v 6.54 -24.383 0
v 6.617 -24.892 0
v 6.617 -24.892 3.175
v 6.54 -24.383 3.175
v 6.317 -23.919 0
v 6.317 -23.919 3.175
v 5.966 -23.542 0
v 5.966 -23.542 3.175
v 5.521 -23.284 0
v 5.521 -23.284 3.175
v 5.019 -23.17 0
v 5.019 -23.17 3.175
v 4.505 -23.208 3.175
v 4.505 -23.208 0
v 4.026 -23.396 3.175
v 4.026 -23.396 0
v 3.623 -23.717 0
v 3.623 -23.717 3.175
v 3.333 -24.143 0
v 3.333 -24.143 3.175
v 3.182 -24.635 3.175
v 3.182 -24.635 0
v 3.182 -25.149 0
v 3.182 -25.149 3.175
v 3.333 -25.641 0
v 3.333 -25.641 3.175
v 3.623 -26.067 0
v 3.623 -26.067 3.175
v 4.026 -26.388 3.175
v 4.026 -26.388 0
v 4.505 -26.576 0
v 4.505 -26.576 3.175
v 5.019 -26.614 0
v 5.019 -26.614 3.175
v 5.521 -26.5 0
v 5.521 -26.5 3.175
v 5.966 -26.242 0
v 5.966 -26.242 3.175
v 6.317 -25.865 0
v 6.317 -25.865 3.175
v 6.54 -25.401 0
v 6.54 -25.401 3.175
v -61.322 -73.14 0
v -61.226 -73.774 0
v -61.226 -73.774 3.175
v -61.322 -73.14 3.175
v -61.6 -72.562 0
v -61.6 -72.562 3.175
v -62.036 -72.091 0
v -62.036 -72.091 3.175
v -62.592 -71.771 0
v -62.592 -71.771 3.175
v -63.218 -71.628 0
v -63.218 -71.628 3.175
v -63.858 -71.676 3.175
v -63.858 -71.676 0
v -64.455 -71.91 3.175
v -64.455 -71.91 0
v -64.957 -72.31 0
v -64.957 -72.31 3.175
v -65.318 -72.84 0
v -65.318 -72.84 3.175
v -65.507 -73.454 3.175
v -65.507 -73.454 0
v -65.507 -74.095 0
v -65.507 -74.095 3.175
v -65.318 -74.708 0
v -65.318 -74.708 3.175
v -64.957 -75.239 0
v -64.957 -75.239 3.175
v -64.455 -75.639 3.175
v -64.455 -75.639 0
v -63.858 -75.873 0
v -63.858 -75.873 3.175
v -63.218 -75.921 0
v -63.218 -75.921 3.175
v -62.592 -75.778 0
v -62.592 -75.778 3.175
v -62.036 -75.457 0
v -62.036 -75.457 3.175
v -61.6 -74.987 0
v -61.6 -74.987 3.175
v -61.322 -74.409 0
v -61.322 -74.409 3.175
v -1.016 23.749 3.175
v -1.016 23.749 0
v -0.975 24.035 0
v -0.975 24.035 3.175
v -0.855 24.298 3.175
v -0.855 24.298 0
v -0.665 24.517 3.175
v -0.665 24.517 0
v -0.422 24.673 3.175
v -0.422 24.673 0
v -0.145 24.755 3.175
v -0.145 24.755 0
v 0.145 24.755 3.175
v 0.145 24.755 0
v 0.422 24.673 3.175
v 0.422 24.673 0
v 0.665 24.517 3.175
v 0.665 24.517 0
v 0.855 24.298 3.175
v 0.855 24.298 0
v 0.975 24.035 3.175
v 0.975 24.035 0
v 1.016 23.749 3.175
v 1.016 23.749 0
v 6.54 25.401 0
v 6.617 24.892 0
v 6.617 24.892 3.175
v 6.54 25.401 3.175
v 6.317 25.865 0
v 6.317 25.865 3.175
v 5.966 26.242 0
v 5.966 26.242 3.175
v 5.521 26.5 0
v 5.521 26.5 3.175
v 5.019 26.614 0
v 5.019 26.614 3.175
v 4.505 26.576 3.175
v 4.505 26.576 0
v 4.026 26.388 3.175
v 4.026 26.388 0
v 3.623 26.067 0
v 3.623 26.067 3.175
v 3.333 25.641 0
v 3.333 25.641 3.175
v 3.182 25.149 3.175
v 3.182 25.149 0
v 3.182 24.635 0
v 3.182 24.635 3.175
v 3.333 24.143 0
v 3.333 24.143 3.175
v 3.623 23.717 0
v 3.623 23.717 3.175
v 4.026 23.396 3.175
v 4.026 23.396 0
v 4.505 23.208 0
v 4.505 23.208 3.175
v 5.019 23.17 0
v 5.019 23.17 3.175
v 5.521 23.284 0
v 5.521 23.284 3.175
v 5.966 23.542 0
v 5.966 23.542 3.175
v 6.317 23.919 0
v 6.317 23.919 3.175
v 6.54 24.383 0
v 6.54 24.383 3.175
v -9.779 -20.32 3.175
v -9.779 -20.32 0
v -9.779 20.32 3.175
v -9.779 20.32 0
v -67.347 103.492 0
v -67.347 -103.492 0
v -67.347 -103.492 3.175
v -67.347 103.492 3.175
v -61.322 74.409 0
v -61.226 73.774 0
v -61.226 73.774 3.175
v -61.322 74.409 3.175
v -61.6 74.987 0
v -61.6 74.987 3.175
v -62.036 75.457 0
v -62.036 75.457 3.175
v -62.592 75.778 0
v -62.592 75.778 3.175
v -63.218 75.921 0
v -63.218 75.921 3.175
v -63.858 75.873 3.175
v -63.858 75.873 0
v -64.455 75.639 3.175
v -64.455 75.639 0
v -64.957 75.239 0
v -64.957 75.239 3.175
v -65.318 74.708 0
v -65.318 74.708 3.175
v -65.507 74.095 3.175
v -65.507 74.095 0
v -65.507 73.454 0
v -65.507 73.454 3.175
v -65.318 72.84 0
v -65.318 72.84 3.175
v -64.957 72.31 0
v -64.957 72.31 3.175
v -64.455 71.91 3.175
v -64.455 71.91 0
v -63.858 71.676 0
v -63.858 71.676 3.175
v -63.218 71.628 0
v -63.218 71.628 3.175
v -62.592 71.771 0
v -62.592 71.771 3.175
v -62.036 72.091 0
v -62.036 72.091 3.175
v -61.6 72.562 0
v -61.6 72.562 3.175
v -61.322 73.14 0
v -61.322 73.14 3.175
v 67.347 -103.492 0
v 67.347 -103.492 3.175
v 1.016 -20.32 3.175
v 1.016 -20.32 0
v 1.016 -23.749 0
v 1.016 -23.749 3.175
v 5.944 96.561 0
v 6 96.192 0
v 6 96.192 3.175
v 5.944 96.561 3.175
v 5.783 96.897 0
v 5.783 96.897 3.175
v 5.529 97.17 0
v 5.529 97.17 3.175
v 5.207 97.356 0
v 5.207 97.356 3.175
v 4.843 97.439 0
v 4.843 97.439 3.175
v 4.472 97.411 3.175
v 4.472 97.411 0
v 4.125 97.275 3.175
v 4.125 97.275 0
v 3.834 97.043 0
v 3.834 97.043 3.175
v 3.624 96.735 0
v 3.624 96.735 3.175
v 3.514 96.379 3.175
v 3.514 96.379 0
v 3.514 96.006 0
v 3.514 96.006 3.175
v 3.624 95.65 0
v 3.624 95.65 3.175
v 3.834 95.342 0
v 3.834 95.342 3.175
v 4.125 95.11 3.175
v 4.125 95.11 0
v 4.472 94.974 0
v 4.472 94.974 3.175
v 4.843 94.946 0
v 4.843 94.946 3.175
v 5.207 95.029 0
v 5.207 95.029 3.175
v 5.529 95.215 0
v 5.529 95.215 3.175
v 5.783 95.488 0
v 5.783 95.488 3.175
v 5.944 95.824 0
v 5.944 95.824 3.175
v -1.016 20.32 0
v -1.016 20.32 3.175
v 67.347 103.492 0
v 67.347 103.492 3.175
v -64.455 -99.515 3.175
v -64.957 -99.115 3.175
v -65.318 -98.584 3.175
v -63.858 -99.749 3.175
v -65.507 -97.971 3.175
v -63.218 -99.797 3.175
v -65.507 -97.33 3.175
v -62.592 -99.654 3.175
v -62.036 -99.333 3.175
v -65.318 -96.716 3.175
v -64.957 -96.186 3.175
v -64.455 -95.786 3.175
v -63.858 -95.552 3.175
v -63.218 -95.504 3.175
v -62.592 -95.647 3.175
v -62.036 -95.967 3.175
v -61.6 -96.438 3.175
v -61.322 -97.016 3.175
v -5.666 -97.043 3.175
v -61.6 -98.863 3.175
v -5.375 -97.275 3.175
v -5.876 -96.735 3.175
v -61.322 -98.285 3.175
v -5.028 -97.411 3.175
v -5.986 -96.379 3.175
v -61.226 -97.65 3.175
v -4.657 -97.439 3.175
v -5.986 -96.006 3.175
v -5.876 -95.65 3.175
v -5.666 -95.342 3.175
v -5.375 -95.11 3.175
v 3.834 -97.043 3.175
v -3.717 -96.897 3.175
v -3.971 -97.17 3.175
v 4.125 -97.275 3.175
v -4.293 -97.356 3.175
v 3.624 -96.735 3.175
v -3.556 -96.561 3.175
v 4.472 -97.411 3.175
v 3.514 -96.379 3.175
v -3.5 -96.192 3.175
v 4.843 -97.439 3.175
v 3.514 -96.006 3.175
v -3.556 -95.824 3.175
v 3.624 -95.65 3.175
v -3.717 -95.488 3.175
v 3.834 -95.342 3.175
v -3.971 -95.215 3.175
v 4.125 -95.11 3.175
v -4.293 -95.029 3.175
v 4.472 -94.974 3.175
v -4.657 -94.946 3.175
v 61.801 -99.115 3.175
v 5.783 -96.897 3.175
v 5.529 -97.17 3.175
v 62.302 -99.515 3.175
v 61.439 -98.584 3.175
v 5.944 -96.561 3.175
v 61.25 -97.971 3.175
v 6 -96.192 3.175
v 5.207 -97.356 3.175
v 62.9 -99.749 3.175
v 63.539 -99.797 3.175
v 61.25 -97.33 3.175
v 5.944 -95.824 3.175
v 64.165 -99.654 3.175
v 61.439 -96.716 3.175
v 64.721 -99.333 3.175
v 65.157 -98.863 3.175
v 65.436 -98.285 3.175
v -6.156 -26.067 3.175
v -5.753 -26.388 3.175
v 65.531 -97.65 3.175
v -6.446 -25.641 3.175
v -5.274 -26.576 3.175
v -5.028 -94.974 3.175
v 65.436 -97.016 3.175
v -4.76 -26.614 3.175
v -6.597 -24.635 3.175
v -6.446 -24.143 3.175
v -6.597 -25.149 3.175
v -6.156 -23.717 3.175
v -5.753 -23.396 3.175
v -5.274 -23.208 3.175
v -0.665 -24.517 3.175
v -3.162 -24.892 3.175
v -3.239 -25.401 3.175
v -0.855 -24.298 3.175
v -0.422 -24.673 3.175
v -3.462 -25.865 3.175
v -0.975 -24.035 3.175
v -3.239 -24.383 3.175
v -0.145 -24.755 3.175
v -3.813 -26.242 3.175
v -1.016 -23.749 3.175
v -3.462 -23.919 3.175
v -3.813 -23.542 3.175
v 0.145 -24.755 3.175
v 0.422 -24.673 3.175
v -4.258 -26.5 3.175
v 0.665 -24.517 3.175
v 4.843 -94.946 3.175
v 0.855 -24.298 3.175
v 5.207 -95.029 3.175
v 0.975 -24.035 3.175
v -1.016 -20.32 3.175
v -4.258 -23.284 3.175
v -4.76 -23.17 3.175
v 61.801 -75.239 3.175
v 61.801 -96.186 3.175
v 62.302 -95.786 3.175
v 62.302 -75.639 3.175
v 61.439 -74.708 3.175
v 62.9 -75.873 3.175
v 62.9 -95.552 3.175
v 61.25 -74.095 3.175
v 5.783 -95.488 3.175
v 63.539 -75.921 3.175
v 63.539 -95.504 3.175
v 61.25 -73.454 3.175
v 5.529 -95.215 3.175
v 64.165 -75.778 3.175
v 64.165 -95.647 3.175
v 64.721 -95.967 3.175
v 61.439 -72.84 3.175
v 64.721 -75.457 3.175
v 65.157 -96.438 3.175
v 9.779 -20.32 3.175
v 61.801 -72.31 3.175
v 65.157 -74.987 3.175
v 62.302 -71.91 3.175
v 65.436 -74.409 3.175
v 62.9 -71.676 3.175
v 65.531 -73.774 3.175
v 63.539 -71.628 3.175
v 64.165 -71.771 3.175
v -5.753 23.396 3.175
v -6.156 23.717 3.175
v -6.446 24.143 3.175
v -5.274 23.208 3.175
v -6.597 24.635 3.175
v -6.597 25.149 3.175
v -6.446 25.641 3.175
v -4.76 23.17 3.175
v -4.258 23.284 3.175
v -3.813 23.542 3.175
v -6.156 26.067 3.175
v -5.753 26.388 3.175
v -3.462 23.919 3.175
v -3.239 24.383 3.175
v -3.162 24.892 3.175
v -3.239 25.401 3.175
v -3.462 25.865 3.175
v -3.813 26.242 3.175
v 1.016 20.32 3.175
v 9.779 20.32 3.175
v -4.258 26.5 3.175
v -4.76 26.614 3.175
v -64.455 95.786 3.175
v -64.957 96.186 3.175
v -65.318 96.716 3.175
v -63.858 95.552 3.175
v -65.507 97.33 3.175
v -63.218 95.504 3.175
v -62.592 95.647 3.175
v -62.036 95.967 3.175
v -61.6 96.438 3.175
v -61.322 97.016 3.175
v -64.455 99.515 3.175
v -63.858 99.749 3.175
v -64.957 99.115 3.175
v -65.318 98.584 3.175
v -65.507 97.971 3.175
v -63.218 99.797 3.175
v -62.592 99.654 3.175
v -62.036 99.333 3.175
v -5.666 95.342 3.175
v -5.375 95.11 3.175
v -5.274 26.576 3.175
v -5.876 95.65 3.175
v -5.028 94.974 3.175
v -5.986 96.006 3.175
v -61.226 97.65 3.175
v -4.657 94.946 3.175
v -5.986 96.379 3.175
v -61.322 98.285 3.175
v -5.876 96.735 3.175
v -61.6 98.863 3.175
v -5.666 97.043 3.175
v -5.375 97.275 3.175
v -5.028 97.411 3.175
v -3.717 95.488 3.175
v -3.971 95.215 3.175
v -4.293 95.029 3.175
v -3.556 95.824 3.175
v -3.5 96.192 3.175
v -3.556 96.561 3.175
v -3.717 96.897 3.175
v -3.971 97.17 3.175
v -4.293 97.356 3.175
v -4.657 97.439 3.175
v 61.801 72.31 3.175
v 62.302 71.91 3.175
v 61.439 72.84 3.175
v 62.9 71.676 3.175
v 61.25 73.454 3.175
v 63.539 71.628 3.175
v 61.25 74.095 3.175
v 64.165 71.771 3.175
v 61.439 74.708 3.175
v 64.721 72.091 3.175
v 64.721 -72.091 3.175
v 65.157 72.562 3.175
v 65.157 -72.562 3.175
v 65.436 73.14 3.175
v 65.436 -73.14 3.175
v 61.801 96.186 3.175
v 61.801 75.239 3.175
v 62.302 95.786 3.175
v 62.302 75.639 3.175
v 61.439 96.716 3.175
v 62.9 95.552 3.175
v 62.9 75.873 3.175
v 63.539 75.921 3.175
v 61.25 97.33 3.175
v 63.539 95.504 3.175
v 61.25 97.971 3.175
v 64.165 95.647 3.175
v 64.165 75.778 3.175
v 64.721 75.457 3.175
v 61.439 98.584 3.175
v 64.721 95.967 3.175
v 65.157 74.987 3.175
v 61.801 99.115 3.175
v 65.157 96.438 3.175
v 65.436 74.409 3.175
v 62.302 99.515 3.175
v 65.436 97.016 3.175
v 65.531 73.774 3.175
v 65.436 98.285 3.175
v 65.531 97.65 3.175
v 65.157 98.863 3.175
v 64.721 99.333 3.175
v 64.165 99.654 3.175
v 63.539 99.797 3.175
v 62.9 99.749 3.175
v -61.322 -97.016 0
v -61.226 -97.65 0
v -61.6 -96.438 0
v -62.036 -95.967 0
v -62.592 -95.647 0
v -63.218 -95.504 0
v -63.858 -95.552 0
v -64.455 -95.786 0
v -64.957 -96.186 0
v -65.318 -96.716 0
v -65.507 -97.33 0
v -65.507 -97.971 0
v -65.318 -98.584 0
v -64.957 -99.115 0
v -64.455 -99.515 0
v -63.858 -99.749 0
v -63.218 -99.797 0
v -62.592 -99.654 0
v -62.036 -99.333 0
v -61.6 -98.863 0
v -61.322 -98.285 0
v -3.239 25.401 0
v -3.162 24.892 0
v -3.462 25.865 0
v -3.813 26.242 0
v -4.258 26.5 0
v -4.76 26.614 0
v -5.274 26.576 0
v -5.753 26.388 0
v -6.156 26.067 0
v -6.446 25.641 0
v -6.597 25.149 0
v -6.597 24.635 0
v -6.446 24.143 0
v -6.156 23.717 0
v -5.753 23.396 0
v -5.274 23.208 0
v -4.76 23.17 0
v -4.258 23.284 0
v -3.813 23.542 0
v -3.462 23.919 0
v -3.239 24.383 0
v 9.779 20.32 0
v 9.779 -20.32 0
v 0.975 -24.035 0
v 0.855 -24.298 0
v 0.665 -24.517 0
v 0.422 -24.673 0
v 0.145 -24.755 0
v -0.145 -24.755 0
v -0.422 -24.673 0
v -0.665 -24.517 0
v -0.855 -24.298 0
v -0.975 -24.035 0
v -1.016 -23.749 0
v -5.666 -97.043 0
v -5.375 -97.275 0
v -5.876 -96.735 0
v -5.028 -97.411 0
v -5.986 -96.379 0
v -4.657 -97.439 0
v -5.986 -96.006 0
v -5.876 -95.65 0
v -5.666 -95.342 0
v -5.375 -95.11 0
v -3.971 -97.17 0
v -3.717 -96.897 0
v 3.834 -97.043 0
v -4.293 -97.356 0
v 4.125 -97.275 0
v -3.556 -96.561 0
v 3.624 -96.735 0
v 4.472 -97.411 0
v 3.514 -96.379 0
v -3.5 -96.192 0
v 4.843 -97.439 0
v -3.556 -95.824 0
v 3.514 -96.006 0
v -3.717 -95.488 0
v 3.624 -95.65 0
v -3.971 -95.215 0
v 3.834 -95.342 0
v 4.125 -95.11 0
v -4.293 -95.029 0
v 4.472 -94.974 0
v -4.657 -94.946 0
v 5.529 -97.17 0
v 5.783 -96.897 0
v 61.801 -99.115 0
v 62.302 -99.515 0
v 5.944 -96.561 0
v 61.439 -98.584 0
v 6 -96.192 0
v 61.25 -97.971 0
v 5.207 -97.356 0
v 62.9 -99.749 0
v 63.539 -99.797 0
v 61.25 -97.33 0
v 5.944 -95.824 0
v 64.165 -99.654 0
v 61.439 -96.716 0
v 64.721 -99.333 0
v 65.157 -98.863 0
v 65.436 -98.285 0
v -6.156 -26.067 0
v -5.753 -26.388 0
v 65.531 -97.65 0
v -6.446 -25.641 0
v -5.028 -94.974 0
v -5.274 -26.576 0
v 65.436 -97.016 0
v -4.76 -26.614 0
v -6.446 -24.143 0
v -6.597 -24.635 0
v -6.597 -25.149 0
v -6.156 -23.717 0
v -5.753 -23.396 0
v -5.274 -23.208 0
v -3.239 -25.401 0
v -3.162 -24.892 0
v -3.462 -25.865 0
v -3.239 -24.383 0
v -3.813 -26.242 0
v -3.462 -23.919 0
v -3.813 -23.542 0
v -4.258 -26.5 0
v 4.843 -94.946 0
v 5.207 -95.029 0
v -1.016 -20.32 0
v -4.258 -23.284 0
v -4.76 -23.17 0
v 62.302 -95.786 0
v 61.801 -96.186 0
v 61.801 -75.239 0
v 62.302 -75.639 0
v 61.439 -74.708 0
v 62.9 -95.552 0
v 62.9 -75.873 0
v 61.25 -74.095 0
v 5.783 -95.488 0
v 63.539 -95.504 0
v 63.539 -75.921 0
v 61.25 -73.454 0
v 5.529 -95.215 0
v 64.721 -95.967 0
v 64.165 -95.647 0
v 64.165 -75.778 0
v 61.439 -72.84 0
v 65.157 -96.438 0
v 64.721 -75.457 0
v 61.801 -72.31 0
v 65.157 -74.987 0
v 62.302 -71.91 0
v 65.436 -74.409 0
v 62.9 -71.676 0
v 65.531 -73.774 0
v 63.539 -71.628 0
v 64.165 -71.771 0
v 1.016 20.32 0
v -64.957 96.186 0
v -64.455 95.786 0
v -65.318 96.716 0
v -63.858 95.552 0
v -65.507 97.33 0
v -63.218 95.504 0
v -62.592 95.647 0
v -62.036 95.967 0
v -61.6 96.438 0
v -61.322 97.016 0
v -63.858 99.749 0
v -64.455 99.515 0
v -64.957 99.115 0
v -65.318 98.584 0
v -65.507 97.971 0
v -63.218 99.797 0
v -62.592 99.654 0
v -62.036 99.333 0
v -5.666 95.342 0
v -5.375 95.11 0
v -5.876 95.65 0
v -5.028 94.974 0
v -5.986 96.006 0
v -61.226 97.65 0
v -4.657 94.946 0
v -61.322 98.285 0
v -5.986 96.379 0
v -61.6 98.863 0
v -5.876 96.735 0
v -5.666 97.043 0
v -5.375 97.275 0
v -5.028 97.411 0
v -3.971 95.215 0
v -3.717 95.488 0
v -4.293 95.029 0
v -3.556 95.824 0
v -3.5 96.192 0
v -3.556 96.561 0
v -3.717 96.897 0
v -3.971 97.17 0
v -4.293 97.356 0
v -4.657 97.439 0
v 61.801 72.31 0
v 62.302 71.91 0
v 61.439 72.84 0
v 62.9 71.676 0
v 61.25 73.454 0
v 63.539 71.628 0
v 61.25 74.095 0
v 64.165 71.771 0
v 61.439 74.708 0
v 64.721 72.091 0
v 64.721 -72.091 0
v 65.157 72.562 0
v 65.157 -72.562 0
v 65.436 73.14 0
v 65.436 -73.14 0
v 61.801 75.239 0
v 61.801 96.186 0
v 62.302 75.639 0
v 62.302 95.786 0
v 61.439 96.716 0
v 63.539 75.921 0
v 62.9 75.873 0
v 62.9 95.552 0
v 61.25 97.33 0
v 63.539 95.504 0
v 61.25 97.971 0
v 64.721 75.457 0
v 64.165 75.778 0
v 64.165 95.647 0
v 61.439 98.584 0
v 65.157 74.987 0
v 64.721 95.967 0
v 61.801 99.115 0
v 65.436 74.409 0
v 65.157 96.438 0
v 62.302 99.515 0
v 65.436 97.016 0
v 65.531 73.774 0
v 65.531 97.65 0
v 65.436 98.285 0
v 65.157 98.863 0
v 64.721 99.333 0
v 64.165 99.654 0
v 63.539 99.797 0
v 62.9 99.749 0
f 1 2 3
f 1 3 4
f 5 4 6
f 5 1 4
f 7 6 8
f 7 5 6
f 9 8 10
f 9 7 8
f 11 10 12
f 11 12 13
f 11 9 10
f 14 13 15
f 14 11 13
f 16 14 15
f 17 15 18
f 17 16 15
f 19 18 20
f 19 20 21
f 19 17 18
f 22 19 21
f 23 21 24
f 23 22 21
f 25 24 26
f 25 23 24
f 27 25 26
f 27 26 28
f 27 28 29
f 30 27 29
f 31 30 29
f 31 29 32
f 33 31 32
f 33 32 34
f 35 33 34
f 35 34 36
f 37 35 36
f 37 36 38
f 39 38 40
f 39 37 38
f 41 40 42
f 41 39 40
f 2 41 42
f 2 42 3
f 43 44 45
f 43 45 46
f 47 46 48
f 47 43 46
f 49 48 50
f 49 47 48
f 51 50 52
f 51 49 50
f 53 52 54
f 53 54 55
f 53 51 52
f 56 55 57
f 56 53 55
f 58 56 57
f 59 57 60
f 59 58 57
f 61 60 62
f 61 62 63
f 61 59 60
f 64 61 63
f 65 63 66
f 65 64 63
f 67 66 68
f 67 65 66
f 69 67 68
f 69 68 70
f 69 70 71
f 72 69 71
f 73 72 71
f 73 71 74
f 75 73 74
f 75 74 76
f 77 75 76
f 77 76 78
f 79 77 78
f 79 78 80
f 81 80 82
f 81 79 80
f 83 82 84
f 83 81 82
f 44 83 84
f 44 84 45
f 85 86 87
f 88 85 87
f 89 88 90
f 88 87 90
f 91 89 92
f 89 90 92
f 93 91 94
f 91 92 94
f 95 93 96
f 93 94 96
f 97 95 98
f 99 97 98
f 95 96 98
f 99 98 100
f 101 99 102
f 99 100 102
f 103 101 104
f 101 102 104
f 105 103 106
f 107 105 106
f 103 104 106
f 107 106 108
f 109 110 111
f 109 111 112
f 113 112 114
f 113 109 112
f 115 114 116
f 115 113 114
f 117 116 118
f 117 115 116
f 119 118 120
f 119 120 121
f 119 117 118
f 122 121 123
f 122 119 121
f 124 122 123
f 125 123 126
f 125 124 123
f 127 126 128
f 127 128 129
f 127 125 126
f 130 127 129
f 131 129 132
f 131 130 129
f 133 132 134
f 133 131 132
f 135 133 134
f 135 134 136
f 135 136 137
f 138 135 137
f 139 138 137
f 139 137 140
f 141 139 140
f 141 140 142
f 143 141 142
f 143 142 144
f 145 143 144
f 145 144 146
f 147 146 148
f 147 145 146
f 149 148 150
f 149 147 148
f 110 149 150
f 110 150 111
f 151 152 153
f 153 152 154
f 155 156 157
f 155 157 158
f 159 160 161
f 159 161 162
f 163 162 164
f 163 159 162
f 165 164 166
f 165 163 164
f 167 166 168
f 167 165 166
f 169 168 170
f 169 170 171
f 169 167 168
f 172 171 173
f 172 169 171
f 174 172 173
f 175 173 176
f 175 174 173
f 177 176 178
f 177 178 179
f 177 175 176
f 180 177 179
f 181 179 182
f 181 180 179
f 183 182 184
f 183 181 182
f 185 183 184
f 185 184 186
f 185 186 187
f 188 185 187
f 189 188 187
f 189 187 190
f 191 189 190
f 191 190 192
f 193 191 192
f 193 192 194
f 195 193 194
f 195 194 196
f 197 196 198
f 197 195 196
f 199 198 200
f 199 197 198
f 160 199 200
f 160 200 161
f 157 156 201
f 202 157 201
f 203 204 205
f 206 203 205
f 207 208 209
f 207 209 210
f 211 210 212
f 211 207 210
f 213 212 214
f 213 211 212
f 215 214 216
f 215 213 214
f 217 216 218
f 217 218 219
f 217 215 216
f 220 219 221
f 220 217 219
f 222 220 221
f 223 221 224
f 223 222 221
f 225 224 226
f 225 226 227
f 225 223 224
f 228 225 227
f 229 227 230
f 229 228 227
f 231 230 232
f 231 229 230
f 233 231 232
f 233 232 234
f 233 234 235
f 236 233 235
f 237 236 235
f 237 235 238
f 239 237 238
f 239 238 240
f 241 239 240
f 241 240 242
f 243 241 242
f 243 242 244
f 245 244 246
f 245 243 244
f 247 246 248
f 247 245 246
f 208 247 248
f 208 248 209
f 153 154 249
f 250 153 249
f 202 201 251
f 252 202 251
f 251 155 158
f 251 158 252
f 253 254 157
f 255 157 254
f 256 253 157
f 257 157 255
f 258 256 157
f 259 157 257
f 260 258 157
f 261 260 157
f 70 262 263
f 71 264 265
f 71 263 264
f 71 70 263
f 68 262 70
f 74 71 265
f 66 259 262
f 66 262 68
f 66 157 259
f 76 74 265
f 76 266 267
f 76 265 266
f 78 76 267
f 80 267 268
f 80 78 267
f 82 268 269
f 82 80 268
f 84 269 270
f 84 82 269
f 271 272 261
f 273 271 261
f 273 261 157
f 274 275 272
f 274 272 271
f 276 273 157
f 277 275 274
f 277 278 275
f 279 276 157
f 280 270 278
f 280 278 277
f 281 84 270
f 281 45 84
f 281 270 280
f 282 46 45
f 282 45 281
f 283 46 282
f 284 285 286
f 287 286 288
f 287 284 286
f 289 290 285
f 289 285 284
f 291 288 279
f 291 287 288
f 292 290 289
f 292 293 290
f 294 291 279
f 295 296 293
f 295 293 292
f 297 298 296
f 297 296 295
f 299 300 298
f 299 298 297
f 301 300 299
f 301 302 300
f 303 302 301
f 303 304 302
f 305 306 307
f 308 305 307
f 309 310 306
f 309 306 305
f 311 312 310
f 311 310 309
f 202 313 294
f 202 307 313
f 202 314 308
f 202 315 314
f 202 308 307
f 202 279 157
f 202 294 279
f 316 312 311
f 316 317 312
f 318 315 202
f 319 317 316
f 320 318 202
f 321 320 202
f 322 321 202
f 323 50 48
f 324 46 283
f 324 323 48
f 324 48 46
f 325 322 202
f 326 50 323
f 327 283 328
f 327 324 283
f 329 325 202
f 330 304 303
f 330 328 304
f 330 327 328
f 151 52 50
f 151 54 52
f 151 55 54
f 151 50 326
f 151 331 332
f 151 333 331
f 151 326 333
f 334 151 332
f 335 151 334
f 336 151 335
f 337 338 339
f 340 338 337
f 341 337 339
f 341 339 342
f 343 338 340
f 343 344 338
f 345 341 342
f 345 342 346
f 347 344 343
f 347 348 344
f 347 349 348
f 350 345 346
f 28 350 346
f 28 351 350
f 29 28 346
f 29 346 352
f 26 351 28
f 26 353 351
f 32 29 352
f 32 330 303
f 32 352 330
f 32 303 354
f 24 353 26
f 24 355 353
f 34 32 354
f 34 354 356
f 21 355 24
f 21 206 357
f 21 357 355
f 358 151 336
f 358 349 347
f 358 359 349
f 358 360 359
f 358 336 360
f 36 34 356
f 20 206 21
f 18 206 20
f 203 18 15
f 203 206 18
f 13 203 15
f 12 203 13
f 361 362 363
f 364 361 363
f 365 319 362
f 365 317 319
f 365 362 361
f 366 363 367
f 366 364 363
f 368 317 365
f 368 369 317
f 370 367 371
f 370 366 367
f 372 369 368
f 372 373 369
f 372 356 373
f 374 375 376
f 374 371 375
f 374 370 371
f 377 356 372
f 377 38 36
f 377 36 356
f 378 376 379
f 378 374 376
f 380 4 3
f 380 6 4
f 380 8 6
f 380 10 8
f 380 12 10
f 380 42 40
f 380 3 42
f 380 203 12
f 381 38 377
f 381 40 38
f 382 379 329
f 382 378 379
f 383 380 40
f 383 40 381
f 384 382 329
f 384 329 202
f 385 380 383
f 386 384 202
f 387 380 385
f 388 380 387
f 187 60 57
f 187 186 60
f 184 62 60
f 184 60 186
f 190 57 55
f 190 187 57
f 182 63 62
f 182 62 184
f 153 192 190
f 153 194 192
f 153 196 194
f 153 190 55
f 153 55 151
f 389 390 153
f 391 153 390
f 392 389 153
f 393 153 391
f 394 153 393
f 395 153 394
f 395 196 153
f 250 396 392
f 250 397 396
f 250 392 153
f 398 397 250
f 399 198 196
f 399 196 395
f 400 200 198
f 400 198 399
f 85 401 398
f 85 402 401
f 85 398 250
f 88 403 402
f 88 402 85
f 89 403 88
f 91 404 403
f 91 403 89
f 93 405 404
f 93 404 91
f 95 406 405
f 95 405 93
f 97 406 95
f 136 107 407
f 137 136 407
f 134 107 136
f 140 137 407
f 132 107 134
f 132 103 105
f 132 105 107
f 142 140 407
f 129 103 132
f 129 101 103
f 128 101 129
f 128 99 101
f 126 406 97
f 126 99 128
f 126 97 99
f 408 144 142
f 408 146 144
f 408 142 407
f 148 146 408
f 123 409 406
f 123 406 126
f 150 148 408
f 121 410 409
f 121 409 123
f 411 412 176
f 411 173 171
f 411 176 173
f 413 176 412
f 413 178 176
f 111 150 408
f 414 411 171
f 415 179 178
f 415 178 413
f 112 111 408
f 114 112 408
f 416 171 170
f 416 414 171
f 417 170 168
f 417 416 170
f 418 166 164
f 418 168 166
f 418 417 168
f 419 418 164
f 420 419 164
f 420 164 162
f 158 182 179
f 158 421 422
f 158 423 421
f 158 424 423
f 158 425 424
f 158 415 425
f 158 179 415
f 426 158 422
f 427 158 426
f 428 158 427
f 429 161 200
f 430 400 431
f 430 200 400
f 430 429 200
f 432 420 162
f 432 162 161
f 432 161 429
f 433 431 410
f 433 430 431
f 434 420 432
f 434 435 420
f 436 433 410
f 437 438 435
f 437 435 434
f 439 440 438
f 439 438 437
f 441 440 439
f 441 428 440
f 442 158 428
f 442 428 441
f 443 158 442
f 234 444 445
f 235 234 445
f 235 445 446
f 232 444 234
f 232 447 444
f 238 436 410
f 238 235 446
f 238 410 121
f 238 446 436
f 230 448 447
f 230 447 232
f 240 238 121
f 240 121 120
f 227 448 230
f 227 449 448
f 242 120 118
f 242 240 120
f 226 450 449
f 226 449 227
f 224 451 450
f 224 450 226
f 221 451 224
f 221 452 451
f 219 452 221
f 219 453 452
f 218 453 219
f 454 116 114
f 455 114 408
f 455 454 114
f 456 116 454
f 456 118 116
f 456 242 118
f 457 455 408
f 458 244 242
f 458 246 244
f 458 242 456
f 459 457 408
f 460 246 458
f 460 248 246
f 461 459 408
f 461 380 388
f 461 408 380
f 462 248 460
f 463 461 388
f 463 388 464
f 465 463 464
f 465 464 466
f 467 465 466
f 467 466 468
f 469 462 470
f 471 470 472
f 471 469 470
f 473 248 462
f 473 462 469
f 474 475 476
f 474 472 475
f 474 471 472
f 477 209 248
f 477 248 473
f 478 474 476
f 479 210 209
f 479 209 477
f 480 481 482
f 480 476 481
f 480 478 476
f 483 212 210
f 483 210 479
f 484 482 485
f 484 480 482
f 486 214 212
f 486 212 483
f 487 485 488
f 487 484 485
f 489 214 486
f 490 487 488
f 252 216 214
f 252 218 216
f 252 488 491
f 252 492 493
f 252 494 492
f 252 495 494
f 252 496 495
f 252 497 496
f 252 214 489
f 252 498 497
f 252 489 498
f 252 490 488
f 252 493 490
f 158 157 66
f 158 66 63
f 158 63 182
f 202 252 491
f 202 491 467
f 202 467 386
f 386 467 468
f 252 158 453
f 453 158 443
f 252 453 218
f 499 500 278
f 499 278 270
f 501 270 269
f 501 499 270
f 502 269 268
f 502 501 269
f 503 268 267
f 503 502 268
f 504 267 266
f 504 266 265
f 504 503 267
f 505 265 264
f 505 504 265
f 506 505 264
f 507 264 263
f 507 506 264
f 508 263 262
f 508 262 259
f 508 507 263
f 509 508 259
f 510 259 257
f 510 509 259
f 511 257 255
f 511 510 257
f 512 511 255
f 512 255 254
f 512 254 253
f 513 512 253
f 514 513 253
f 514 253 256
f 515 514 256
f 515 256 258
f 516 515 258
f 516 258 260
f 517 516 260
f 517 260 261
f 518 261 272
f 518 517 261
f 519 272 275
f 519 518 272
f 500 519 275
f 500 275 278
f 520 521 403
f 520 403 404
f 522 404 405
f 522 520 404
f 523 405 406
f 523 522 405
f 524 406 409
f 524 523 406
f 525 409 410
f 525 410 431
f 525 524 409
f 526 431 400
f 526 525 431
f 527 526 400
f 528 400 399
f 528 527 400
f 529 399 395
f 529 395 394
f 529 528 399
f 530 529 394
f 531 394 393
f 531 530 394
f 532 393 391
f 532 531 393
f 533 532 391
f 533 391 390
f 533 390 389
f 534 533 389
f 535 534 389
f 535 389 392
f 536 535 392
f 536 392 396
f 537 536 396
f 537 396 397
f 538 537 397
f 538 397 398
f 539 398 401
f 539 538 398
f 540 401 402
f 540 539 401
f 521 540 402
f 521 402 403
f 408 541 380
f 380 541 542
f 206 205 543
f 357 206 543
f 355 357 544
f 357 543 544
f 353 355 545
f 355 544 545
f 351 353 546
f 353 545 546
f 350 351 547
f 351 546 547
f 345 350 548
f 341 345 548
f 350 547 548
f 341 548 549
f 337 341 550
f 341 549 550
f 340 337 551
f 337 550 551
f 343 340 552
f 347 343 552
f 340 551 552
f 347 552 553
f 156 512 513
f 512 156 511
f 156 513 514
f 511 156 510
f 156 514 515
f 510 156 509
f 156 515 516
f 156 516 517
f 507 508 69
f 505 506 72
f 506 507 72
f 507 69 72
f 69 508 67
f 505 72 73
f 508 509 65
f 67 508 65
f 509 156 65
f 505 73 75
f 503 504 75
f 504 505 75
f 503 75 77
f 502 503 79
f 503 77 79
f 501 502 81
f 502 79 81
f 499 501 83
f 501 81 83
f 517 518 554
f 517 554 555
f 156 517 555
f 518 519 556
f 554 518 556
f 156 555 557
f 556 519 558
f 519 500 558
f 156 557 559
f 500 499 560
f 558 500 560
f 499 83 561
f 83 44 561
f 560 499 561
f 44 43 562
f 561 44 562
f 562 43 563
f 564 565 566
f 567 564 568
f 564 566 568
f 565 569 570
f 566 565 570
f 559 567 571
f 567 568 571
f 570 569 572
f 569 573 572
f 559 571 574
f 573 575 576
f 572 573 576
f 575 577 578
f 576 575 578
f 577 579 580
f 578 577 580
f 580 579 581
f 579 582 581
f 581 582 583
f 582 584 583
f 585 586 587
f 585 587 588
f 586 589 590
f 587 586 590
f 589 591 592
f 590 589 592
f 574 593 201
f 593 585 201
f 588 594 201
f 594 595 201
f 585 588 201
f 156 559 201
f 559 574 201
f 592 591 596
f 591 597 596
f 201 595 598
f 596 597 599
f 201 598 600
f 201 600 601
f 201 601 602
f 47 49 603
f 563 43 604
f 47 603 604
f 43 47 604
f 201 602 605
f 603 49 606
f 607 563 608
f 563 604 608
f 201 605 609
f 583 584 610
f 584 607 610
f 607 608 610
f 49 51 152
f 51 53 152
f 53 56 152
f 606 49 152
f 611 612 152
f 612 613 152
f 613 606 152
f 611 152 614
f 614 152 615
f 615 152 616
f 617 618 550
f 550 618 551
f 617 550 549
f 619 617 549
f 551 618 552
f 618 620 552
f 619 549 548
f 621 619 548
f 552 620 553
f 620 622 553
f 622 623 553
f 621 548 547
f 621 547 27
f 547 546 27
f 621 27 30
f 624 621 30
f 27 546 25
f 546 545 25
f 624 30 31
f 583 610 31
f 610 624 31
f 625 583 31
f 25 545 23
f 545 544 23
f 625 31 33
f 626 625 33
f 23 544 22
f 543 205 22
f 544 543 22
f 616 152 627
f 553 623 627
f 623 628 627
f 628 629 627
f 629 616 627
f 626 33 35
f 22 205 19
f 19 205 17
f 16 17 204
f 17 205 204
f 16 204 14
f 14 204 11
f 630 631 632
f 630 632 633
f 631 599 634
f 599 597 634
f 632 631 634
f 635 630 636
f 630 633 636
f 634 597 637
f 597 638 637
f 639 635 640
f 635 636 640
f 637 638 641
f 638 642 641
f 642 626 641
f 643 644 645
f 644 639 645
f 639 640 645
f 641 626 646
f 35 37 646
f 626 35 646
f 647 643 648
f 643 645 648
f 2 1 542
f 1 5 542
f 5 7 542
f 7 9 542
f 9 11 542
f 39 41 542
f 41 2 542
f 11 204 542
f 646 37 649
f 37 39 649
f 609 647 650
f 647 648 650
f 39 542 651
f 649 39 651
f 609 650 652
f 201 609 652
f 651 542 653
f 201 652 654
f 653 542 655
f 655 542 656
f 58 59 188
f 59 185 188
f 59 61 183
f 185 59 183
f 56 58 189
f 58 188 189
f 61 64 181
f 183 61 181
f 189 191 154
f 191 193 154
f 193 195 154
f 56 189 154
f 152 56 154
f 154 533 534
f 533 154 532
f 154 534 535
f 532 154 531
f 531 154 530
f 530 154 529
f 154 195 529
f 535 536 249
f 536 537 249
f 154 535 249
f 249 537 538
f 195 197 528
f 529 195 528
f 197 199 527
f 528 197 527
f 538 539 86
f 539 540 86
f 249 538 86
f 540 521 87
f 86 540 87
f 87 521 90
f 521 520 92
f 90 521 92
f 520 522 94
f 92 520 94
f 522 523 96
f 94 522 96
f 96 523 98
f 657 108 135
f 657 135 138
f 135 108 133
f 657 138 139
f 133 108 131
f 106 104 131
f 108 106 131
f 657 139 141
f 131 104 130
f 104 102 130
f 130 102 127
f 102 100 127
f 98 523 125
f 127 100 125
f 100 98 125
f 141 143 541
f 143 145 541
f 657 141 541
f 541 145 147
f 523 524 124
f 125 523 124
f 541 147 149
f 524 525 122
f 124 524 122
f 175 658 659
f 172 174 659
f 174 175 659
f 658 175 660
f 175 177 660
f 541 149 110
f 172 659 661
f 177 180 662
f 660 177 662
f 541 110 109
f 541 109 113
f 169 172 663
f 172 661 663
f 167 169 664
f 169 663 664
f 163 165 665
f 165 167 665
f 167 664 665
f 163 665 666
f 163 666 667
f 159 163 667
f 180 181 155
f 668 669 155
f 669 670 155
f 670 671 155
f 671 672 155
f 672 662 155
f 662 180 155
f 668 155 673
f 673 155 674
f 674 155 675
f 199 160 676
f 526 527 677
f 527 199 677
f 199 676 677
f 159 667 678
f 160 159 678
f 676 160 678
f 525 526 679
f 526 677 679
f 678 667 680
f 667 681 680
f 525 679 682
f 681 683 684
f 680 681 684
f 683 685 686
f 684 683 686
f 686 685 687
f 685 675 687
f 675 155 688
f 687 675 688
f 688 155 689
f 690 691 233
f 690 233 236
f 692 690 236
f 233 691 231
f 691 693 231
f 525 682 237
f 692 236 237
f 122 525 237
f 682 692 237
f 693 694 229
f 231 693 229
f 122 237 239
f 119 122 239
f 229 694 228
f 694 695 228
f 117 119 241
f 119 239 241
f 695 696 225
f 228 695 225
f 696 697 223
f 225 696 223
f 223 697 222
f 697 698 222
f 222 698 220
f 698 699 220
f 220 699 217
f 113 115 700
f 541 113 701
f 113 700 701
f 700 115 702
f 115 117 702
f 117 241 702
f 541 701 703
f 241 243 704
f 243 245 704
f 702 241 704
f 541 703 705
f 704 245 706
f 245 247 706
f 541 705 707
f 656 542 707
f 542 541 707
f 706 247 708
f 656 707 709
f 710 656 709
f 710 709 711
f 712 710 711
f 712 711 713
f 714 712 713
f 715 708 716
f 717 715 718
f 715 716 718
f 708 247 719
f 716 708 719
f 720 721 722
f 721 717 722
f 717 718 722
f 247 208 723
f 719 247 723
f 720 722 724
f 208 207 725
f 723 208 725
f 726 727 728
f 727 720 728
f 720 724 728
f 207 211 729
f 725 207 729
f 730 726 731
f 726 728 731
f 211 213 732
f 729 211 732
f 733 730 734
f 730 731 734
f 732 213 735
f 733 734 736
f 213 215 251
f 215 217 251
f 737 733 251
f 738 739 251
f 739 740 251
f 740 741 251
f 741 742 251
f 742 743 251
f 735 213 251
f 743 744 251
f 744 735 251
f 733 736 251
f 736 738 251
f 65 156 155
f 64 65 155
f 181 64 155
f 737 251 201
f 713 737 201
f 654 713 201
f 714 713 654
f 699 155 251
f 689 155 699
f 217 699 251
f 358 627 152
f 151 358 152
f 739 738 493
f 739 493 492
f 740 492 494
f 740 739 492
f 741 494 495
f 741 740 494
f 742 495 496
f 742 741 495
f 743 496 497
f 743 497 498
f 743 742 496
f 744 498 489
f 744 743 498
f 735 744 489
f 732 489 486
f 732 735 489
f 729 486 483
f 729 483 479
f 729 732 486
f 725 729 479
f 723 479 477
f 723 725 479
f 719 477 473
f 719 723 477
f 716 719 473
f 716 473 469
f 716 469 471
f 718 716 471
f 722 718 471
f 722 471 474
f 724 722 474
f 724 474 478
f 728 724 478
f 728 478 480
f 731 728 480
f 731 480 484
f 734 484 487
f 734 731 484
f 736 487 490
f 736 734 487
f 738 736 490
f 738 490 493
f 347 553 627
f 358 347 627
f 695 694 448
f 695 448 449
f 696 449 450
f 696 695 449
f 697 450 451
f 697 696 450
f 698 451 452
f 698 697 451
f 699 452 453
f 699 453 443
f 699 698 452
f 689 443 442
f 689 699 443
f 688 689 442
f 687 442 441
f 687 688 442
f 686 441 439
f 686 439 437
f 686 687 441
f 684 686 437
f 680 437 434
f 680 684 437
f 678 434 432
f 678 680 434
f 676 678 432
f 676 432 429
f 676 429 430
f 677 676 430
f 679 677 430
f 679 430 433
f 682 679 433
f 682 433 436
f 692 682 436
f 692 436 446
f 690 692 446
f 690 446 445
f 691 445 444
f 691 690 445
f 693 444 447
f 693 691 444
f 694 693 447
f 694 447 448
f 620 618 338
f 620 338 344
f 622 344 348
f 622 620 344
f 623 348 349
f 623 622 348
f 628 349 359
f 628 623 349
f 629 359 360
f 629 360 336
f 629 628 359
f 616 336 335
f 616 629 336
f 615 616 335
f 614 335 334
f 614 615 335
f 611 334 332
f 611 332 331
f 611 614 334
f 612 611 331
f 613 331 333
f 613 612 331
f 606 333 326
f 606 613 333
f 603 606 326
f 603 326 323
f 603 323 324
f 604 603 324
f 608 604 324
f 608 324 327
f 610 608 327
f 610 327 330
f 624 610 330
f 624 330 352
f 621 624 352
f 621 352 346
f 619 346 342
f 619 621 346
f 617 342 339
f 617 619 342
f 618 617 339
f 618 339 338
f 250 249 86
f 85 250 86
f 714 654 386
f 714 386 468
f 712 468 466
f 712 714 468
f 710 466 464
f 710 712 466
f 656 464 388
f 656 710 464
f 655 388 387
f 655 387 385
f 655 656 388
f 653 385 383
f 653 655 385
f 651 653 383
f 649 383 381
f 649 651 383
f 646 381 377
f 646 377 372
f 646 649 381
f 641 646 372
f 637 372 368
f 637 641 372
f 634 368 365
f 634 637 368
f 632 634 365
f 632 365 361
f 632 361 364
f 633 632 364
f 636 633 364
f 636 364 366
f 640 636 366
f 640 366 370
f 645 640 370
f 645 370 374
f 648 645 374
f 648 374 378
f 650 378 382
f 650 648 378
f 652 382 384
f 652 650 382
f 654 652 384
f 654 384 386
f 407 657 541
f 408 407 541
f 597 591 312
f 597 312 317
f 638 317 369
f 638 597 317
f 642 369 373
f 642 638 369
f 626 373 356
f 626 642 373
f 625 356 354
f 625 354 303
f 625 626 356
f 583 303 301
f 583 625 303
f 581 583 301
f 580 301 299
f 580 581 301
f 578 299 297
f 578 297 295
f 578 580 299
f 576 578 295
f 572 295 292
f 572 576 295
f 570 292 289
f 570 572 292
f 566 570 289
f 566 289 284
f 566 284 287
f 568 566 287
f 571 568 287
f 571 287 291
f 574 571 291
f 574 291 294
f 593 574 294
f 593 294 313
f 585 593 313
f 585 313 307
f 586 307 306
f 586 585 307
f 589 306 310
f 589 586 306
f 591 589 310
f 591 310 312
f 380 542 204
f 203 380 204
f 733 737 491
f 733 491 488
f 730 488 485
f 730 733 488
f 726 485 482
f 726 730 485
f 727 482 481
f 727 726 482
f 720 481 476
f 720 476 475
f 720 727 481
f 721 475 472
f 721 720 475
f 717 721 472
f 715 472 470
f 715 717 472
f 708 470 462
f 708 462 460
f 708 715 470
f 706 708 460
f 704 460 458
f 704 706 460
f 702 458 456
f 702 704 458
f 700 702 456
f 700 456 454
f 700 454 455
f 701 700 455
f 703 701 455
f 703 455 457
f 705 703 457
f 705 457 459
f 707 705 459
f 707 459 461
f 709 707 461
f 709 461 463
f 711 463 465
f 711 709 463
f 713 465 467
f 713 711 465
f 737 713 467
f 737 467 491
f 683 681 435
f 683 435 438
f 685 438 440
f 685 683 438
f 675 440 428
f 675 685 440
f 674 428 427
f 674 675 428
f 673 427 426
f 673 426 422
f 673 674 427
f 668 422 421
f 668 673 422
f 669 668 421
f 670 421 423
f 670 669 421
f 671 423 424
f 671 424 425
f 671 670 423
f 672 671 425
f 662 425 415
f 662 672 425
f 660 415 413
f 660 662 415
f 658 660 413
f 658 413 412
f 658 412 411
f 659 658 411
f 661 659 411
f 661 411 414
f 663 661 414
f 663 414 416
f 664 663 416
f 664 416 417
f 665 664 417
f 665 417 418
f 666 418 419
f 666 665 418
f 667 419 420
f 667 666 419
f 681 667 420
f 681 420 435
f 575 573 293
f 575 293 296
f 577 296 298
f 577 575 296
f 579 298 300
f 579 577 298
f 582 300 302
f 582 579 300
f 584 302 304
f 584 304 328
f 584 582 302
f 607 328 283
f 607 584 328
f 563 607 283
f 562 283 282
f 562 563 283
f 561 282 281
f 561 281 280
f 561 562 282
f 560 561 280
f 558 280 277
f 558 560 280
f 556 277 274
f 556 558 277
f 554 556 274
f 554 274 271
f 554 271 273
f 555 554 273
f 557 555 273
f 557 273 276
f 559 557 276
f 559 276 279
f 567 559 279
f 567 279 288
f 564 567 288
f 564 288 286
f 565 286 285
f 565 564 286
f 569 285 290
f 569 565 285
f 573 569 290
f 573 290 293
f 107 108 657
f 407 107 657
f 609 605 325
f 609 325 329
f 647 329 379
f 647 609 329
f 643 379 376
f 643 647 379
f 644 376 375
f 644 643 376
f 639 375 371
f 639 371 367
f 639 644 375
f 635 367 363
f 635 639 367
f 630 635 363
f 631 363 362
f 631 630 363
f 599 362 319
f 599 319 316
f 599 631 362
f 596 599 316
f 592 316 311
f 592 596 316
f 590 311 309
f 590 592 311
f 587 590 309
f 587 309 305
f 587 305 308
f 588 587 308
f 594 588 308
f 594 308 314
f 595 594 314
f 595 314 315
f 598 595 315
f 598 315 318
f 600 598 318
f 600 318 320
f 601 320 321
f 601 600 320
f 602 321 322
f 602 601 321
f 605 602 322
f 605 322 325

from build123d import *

# Parameters (mm, degrees)
F0_W     = 134.69465
F0_H     = 206.984854
F0_R     = 2.15265
F0_R_2   = 1.25
F0_R_3   = 1.7272
F1_DEPTH = 3.175


with BuildPart() as f1:
    # F0 (on Top) → F1 (new body)
    with BuildSketch(Plane.XY):
        Rectangle(F0_W, F0_H)
        with Locations((-63.378575, -97.650427)):
            Circle(F0_R, mode=Mode.SUBTRACT)
        with Locations((-63.378575, -73.774427)):
            Circle(F0_R, mode=Mode.SUBTRACT)
        with Locations((-4.750003, -96.192416)):
            Circle(F0_R_2, mode=Mode.SUBTRACT)
        with Locations((-4.8895, -24.892)):
            Circle(F0_R_3, mode=Mode.SUBTRACT)
        with Locations((4.750003, -96.192416)):
            Circle(F0_R_2, mode=Mode.SUBTRACT)
        with Locations((63.378575, -97.650427)):
            Circle(F0_R, mode=Mode.SUBTRACT)
        with Locations((63.378575, -73.774427)):
            Circle(F0_R, mode=Mode.SUBTRACT)
        with Locations((4.8895, -24.892)):
            Circle(F0_R_3, mode=Mode.SUBTRACT)
        with BuildLine():
            Line((-1.016, -20.32), (-9.779, -20.32))
            Line((-9.779, -20.32), (-9.779, 20.32))
            Line((-9.779, 20.32), (-1.016, 20.32))
            Line((-1.016, 20.32), (-1.016, 23.749))
            ThreePointArc((-1.016, 23.749), (0, 24.765), (1.016, 23.749))
            Line((1.016, 23.749), (1.016, 20.32))
            Line((1.016, 20.32), (9.779, 20.32))
            Line((9.779, 20.32), (9.779, -20.32))
            Line((9.779, -20.32), (1.016, -20.32))
            Line((1.016, -20.32), (1.016, -23.749))
            ThreePointArc((1.016, -23.749), (0, -24.765), (-1.016, -23.749))
            Line((-1.016, -23.749), (-1.016, -20.32))
        make_face(mode=Mode.SUBTRACT)
        with Locations((-4.8895, 24.892)):
            Circle(F0_R_3, mode=Mode.SUBTRACT)
        with Locations((-63.378575, 73.774427)):
            Circle(F0_R, mode=Mode.SUBTRACT)
        with Locations((-63.378575, 97.650427)):
            Circle(F0_R, mode=Mode.SUBTRACT)
        with Locations((-4.750003, 96.192416)):
            Circle(F0_R_2, mode=Mode.SUBTRACT)
        with Locations((4.8895, 24.892)):
            Circle(F0_R_3, mode=Mode.SUBTRACT)
        with Locations((4.750003, 96.192416)):
            Circle(F0_R_2, mode=Mode.SUBTRACT)
        with Locations((63.378575, 73.774427)):
            Circle(F0_R, mode=Mode.SUBTRACT)
        with Locations((63.378575, 97.650427)):
            Circle(F0_R, mode=Mode.SUBTRACT)
    extrude(amount=F1_DEPTH)


solid = f1.part
